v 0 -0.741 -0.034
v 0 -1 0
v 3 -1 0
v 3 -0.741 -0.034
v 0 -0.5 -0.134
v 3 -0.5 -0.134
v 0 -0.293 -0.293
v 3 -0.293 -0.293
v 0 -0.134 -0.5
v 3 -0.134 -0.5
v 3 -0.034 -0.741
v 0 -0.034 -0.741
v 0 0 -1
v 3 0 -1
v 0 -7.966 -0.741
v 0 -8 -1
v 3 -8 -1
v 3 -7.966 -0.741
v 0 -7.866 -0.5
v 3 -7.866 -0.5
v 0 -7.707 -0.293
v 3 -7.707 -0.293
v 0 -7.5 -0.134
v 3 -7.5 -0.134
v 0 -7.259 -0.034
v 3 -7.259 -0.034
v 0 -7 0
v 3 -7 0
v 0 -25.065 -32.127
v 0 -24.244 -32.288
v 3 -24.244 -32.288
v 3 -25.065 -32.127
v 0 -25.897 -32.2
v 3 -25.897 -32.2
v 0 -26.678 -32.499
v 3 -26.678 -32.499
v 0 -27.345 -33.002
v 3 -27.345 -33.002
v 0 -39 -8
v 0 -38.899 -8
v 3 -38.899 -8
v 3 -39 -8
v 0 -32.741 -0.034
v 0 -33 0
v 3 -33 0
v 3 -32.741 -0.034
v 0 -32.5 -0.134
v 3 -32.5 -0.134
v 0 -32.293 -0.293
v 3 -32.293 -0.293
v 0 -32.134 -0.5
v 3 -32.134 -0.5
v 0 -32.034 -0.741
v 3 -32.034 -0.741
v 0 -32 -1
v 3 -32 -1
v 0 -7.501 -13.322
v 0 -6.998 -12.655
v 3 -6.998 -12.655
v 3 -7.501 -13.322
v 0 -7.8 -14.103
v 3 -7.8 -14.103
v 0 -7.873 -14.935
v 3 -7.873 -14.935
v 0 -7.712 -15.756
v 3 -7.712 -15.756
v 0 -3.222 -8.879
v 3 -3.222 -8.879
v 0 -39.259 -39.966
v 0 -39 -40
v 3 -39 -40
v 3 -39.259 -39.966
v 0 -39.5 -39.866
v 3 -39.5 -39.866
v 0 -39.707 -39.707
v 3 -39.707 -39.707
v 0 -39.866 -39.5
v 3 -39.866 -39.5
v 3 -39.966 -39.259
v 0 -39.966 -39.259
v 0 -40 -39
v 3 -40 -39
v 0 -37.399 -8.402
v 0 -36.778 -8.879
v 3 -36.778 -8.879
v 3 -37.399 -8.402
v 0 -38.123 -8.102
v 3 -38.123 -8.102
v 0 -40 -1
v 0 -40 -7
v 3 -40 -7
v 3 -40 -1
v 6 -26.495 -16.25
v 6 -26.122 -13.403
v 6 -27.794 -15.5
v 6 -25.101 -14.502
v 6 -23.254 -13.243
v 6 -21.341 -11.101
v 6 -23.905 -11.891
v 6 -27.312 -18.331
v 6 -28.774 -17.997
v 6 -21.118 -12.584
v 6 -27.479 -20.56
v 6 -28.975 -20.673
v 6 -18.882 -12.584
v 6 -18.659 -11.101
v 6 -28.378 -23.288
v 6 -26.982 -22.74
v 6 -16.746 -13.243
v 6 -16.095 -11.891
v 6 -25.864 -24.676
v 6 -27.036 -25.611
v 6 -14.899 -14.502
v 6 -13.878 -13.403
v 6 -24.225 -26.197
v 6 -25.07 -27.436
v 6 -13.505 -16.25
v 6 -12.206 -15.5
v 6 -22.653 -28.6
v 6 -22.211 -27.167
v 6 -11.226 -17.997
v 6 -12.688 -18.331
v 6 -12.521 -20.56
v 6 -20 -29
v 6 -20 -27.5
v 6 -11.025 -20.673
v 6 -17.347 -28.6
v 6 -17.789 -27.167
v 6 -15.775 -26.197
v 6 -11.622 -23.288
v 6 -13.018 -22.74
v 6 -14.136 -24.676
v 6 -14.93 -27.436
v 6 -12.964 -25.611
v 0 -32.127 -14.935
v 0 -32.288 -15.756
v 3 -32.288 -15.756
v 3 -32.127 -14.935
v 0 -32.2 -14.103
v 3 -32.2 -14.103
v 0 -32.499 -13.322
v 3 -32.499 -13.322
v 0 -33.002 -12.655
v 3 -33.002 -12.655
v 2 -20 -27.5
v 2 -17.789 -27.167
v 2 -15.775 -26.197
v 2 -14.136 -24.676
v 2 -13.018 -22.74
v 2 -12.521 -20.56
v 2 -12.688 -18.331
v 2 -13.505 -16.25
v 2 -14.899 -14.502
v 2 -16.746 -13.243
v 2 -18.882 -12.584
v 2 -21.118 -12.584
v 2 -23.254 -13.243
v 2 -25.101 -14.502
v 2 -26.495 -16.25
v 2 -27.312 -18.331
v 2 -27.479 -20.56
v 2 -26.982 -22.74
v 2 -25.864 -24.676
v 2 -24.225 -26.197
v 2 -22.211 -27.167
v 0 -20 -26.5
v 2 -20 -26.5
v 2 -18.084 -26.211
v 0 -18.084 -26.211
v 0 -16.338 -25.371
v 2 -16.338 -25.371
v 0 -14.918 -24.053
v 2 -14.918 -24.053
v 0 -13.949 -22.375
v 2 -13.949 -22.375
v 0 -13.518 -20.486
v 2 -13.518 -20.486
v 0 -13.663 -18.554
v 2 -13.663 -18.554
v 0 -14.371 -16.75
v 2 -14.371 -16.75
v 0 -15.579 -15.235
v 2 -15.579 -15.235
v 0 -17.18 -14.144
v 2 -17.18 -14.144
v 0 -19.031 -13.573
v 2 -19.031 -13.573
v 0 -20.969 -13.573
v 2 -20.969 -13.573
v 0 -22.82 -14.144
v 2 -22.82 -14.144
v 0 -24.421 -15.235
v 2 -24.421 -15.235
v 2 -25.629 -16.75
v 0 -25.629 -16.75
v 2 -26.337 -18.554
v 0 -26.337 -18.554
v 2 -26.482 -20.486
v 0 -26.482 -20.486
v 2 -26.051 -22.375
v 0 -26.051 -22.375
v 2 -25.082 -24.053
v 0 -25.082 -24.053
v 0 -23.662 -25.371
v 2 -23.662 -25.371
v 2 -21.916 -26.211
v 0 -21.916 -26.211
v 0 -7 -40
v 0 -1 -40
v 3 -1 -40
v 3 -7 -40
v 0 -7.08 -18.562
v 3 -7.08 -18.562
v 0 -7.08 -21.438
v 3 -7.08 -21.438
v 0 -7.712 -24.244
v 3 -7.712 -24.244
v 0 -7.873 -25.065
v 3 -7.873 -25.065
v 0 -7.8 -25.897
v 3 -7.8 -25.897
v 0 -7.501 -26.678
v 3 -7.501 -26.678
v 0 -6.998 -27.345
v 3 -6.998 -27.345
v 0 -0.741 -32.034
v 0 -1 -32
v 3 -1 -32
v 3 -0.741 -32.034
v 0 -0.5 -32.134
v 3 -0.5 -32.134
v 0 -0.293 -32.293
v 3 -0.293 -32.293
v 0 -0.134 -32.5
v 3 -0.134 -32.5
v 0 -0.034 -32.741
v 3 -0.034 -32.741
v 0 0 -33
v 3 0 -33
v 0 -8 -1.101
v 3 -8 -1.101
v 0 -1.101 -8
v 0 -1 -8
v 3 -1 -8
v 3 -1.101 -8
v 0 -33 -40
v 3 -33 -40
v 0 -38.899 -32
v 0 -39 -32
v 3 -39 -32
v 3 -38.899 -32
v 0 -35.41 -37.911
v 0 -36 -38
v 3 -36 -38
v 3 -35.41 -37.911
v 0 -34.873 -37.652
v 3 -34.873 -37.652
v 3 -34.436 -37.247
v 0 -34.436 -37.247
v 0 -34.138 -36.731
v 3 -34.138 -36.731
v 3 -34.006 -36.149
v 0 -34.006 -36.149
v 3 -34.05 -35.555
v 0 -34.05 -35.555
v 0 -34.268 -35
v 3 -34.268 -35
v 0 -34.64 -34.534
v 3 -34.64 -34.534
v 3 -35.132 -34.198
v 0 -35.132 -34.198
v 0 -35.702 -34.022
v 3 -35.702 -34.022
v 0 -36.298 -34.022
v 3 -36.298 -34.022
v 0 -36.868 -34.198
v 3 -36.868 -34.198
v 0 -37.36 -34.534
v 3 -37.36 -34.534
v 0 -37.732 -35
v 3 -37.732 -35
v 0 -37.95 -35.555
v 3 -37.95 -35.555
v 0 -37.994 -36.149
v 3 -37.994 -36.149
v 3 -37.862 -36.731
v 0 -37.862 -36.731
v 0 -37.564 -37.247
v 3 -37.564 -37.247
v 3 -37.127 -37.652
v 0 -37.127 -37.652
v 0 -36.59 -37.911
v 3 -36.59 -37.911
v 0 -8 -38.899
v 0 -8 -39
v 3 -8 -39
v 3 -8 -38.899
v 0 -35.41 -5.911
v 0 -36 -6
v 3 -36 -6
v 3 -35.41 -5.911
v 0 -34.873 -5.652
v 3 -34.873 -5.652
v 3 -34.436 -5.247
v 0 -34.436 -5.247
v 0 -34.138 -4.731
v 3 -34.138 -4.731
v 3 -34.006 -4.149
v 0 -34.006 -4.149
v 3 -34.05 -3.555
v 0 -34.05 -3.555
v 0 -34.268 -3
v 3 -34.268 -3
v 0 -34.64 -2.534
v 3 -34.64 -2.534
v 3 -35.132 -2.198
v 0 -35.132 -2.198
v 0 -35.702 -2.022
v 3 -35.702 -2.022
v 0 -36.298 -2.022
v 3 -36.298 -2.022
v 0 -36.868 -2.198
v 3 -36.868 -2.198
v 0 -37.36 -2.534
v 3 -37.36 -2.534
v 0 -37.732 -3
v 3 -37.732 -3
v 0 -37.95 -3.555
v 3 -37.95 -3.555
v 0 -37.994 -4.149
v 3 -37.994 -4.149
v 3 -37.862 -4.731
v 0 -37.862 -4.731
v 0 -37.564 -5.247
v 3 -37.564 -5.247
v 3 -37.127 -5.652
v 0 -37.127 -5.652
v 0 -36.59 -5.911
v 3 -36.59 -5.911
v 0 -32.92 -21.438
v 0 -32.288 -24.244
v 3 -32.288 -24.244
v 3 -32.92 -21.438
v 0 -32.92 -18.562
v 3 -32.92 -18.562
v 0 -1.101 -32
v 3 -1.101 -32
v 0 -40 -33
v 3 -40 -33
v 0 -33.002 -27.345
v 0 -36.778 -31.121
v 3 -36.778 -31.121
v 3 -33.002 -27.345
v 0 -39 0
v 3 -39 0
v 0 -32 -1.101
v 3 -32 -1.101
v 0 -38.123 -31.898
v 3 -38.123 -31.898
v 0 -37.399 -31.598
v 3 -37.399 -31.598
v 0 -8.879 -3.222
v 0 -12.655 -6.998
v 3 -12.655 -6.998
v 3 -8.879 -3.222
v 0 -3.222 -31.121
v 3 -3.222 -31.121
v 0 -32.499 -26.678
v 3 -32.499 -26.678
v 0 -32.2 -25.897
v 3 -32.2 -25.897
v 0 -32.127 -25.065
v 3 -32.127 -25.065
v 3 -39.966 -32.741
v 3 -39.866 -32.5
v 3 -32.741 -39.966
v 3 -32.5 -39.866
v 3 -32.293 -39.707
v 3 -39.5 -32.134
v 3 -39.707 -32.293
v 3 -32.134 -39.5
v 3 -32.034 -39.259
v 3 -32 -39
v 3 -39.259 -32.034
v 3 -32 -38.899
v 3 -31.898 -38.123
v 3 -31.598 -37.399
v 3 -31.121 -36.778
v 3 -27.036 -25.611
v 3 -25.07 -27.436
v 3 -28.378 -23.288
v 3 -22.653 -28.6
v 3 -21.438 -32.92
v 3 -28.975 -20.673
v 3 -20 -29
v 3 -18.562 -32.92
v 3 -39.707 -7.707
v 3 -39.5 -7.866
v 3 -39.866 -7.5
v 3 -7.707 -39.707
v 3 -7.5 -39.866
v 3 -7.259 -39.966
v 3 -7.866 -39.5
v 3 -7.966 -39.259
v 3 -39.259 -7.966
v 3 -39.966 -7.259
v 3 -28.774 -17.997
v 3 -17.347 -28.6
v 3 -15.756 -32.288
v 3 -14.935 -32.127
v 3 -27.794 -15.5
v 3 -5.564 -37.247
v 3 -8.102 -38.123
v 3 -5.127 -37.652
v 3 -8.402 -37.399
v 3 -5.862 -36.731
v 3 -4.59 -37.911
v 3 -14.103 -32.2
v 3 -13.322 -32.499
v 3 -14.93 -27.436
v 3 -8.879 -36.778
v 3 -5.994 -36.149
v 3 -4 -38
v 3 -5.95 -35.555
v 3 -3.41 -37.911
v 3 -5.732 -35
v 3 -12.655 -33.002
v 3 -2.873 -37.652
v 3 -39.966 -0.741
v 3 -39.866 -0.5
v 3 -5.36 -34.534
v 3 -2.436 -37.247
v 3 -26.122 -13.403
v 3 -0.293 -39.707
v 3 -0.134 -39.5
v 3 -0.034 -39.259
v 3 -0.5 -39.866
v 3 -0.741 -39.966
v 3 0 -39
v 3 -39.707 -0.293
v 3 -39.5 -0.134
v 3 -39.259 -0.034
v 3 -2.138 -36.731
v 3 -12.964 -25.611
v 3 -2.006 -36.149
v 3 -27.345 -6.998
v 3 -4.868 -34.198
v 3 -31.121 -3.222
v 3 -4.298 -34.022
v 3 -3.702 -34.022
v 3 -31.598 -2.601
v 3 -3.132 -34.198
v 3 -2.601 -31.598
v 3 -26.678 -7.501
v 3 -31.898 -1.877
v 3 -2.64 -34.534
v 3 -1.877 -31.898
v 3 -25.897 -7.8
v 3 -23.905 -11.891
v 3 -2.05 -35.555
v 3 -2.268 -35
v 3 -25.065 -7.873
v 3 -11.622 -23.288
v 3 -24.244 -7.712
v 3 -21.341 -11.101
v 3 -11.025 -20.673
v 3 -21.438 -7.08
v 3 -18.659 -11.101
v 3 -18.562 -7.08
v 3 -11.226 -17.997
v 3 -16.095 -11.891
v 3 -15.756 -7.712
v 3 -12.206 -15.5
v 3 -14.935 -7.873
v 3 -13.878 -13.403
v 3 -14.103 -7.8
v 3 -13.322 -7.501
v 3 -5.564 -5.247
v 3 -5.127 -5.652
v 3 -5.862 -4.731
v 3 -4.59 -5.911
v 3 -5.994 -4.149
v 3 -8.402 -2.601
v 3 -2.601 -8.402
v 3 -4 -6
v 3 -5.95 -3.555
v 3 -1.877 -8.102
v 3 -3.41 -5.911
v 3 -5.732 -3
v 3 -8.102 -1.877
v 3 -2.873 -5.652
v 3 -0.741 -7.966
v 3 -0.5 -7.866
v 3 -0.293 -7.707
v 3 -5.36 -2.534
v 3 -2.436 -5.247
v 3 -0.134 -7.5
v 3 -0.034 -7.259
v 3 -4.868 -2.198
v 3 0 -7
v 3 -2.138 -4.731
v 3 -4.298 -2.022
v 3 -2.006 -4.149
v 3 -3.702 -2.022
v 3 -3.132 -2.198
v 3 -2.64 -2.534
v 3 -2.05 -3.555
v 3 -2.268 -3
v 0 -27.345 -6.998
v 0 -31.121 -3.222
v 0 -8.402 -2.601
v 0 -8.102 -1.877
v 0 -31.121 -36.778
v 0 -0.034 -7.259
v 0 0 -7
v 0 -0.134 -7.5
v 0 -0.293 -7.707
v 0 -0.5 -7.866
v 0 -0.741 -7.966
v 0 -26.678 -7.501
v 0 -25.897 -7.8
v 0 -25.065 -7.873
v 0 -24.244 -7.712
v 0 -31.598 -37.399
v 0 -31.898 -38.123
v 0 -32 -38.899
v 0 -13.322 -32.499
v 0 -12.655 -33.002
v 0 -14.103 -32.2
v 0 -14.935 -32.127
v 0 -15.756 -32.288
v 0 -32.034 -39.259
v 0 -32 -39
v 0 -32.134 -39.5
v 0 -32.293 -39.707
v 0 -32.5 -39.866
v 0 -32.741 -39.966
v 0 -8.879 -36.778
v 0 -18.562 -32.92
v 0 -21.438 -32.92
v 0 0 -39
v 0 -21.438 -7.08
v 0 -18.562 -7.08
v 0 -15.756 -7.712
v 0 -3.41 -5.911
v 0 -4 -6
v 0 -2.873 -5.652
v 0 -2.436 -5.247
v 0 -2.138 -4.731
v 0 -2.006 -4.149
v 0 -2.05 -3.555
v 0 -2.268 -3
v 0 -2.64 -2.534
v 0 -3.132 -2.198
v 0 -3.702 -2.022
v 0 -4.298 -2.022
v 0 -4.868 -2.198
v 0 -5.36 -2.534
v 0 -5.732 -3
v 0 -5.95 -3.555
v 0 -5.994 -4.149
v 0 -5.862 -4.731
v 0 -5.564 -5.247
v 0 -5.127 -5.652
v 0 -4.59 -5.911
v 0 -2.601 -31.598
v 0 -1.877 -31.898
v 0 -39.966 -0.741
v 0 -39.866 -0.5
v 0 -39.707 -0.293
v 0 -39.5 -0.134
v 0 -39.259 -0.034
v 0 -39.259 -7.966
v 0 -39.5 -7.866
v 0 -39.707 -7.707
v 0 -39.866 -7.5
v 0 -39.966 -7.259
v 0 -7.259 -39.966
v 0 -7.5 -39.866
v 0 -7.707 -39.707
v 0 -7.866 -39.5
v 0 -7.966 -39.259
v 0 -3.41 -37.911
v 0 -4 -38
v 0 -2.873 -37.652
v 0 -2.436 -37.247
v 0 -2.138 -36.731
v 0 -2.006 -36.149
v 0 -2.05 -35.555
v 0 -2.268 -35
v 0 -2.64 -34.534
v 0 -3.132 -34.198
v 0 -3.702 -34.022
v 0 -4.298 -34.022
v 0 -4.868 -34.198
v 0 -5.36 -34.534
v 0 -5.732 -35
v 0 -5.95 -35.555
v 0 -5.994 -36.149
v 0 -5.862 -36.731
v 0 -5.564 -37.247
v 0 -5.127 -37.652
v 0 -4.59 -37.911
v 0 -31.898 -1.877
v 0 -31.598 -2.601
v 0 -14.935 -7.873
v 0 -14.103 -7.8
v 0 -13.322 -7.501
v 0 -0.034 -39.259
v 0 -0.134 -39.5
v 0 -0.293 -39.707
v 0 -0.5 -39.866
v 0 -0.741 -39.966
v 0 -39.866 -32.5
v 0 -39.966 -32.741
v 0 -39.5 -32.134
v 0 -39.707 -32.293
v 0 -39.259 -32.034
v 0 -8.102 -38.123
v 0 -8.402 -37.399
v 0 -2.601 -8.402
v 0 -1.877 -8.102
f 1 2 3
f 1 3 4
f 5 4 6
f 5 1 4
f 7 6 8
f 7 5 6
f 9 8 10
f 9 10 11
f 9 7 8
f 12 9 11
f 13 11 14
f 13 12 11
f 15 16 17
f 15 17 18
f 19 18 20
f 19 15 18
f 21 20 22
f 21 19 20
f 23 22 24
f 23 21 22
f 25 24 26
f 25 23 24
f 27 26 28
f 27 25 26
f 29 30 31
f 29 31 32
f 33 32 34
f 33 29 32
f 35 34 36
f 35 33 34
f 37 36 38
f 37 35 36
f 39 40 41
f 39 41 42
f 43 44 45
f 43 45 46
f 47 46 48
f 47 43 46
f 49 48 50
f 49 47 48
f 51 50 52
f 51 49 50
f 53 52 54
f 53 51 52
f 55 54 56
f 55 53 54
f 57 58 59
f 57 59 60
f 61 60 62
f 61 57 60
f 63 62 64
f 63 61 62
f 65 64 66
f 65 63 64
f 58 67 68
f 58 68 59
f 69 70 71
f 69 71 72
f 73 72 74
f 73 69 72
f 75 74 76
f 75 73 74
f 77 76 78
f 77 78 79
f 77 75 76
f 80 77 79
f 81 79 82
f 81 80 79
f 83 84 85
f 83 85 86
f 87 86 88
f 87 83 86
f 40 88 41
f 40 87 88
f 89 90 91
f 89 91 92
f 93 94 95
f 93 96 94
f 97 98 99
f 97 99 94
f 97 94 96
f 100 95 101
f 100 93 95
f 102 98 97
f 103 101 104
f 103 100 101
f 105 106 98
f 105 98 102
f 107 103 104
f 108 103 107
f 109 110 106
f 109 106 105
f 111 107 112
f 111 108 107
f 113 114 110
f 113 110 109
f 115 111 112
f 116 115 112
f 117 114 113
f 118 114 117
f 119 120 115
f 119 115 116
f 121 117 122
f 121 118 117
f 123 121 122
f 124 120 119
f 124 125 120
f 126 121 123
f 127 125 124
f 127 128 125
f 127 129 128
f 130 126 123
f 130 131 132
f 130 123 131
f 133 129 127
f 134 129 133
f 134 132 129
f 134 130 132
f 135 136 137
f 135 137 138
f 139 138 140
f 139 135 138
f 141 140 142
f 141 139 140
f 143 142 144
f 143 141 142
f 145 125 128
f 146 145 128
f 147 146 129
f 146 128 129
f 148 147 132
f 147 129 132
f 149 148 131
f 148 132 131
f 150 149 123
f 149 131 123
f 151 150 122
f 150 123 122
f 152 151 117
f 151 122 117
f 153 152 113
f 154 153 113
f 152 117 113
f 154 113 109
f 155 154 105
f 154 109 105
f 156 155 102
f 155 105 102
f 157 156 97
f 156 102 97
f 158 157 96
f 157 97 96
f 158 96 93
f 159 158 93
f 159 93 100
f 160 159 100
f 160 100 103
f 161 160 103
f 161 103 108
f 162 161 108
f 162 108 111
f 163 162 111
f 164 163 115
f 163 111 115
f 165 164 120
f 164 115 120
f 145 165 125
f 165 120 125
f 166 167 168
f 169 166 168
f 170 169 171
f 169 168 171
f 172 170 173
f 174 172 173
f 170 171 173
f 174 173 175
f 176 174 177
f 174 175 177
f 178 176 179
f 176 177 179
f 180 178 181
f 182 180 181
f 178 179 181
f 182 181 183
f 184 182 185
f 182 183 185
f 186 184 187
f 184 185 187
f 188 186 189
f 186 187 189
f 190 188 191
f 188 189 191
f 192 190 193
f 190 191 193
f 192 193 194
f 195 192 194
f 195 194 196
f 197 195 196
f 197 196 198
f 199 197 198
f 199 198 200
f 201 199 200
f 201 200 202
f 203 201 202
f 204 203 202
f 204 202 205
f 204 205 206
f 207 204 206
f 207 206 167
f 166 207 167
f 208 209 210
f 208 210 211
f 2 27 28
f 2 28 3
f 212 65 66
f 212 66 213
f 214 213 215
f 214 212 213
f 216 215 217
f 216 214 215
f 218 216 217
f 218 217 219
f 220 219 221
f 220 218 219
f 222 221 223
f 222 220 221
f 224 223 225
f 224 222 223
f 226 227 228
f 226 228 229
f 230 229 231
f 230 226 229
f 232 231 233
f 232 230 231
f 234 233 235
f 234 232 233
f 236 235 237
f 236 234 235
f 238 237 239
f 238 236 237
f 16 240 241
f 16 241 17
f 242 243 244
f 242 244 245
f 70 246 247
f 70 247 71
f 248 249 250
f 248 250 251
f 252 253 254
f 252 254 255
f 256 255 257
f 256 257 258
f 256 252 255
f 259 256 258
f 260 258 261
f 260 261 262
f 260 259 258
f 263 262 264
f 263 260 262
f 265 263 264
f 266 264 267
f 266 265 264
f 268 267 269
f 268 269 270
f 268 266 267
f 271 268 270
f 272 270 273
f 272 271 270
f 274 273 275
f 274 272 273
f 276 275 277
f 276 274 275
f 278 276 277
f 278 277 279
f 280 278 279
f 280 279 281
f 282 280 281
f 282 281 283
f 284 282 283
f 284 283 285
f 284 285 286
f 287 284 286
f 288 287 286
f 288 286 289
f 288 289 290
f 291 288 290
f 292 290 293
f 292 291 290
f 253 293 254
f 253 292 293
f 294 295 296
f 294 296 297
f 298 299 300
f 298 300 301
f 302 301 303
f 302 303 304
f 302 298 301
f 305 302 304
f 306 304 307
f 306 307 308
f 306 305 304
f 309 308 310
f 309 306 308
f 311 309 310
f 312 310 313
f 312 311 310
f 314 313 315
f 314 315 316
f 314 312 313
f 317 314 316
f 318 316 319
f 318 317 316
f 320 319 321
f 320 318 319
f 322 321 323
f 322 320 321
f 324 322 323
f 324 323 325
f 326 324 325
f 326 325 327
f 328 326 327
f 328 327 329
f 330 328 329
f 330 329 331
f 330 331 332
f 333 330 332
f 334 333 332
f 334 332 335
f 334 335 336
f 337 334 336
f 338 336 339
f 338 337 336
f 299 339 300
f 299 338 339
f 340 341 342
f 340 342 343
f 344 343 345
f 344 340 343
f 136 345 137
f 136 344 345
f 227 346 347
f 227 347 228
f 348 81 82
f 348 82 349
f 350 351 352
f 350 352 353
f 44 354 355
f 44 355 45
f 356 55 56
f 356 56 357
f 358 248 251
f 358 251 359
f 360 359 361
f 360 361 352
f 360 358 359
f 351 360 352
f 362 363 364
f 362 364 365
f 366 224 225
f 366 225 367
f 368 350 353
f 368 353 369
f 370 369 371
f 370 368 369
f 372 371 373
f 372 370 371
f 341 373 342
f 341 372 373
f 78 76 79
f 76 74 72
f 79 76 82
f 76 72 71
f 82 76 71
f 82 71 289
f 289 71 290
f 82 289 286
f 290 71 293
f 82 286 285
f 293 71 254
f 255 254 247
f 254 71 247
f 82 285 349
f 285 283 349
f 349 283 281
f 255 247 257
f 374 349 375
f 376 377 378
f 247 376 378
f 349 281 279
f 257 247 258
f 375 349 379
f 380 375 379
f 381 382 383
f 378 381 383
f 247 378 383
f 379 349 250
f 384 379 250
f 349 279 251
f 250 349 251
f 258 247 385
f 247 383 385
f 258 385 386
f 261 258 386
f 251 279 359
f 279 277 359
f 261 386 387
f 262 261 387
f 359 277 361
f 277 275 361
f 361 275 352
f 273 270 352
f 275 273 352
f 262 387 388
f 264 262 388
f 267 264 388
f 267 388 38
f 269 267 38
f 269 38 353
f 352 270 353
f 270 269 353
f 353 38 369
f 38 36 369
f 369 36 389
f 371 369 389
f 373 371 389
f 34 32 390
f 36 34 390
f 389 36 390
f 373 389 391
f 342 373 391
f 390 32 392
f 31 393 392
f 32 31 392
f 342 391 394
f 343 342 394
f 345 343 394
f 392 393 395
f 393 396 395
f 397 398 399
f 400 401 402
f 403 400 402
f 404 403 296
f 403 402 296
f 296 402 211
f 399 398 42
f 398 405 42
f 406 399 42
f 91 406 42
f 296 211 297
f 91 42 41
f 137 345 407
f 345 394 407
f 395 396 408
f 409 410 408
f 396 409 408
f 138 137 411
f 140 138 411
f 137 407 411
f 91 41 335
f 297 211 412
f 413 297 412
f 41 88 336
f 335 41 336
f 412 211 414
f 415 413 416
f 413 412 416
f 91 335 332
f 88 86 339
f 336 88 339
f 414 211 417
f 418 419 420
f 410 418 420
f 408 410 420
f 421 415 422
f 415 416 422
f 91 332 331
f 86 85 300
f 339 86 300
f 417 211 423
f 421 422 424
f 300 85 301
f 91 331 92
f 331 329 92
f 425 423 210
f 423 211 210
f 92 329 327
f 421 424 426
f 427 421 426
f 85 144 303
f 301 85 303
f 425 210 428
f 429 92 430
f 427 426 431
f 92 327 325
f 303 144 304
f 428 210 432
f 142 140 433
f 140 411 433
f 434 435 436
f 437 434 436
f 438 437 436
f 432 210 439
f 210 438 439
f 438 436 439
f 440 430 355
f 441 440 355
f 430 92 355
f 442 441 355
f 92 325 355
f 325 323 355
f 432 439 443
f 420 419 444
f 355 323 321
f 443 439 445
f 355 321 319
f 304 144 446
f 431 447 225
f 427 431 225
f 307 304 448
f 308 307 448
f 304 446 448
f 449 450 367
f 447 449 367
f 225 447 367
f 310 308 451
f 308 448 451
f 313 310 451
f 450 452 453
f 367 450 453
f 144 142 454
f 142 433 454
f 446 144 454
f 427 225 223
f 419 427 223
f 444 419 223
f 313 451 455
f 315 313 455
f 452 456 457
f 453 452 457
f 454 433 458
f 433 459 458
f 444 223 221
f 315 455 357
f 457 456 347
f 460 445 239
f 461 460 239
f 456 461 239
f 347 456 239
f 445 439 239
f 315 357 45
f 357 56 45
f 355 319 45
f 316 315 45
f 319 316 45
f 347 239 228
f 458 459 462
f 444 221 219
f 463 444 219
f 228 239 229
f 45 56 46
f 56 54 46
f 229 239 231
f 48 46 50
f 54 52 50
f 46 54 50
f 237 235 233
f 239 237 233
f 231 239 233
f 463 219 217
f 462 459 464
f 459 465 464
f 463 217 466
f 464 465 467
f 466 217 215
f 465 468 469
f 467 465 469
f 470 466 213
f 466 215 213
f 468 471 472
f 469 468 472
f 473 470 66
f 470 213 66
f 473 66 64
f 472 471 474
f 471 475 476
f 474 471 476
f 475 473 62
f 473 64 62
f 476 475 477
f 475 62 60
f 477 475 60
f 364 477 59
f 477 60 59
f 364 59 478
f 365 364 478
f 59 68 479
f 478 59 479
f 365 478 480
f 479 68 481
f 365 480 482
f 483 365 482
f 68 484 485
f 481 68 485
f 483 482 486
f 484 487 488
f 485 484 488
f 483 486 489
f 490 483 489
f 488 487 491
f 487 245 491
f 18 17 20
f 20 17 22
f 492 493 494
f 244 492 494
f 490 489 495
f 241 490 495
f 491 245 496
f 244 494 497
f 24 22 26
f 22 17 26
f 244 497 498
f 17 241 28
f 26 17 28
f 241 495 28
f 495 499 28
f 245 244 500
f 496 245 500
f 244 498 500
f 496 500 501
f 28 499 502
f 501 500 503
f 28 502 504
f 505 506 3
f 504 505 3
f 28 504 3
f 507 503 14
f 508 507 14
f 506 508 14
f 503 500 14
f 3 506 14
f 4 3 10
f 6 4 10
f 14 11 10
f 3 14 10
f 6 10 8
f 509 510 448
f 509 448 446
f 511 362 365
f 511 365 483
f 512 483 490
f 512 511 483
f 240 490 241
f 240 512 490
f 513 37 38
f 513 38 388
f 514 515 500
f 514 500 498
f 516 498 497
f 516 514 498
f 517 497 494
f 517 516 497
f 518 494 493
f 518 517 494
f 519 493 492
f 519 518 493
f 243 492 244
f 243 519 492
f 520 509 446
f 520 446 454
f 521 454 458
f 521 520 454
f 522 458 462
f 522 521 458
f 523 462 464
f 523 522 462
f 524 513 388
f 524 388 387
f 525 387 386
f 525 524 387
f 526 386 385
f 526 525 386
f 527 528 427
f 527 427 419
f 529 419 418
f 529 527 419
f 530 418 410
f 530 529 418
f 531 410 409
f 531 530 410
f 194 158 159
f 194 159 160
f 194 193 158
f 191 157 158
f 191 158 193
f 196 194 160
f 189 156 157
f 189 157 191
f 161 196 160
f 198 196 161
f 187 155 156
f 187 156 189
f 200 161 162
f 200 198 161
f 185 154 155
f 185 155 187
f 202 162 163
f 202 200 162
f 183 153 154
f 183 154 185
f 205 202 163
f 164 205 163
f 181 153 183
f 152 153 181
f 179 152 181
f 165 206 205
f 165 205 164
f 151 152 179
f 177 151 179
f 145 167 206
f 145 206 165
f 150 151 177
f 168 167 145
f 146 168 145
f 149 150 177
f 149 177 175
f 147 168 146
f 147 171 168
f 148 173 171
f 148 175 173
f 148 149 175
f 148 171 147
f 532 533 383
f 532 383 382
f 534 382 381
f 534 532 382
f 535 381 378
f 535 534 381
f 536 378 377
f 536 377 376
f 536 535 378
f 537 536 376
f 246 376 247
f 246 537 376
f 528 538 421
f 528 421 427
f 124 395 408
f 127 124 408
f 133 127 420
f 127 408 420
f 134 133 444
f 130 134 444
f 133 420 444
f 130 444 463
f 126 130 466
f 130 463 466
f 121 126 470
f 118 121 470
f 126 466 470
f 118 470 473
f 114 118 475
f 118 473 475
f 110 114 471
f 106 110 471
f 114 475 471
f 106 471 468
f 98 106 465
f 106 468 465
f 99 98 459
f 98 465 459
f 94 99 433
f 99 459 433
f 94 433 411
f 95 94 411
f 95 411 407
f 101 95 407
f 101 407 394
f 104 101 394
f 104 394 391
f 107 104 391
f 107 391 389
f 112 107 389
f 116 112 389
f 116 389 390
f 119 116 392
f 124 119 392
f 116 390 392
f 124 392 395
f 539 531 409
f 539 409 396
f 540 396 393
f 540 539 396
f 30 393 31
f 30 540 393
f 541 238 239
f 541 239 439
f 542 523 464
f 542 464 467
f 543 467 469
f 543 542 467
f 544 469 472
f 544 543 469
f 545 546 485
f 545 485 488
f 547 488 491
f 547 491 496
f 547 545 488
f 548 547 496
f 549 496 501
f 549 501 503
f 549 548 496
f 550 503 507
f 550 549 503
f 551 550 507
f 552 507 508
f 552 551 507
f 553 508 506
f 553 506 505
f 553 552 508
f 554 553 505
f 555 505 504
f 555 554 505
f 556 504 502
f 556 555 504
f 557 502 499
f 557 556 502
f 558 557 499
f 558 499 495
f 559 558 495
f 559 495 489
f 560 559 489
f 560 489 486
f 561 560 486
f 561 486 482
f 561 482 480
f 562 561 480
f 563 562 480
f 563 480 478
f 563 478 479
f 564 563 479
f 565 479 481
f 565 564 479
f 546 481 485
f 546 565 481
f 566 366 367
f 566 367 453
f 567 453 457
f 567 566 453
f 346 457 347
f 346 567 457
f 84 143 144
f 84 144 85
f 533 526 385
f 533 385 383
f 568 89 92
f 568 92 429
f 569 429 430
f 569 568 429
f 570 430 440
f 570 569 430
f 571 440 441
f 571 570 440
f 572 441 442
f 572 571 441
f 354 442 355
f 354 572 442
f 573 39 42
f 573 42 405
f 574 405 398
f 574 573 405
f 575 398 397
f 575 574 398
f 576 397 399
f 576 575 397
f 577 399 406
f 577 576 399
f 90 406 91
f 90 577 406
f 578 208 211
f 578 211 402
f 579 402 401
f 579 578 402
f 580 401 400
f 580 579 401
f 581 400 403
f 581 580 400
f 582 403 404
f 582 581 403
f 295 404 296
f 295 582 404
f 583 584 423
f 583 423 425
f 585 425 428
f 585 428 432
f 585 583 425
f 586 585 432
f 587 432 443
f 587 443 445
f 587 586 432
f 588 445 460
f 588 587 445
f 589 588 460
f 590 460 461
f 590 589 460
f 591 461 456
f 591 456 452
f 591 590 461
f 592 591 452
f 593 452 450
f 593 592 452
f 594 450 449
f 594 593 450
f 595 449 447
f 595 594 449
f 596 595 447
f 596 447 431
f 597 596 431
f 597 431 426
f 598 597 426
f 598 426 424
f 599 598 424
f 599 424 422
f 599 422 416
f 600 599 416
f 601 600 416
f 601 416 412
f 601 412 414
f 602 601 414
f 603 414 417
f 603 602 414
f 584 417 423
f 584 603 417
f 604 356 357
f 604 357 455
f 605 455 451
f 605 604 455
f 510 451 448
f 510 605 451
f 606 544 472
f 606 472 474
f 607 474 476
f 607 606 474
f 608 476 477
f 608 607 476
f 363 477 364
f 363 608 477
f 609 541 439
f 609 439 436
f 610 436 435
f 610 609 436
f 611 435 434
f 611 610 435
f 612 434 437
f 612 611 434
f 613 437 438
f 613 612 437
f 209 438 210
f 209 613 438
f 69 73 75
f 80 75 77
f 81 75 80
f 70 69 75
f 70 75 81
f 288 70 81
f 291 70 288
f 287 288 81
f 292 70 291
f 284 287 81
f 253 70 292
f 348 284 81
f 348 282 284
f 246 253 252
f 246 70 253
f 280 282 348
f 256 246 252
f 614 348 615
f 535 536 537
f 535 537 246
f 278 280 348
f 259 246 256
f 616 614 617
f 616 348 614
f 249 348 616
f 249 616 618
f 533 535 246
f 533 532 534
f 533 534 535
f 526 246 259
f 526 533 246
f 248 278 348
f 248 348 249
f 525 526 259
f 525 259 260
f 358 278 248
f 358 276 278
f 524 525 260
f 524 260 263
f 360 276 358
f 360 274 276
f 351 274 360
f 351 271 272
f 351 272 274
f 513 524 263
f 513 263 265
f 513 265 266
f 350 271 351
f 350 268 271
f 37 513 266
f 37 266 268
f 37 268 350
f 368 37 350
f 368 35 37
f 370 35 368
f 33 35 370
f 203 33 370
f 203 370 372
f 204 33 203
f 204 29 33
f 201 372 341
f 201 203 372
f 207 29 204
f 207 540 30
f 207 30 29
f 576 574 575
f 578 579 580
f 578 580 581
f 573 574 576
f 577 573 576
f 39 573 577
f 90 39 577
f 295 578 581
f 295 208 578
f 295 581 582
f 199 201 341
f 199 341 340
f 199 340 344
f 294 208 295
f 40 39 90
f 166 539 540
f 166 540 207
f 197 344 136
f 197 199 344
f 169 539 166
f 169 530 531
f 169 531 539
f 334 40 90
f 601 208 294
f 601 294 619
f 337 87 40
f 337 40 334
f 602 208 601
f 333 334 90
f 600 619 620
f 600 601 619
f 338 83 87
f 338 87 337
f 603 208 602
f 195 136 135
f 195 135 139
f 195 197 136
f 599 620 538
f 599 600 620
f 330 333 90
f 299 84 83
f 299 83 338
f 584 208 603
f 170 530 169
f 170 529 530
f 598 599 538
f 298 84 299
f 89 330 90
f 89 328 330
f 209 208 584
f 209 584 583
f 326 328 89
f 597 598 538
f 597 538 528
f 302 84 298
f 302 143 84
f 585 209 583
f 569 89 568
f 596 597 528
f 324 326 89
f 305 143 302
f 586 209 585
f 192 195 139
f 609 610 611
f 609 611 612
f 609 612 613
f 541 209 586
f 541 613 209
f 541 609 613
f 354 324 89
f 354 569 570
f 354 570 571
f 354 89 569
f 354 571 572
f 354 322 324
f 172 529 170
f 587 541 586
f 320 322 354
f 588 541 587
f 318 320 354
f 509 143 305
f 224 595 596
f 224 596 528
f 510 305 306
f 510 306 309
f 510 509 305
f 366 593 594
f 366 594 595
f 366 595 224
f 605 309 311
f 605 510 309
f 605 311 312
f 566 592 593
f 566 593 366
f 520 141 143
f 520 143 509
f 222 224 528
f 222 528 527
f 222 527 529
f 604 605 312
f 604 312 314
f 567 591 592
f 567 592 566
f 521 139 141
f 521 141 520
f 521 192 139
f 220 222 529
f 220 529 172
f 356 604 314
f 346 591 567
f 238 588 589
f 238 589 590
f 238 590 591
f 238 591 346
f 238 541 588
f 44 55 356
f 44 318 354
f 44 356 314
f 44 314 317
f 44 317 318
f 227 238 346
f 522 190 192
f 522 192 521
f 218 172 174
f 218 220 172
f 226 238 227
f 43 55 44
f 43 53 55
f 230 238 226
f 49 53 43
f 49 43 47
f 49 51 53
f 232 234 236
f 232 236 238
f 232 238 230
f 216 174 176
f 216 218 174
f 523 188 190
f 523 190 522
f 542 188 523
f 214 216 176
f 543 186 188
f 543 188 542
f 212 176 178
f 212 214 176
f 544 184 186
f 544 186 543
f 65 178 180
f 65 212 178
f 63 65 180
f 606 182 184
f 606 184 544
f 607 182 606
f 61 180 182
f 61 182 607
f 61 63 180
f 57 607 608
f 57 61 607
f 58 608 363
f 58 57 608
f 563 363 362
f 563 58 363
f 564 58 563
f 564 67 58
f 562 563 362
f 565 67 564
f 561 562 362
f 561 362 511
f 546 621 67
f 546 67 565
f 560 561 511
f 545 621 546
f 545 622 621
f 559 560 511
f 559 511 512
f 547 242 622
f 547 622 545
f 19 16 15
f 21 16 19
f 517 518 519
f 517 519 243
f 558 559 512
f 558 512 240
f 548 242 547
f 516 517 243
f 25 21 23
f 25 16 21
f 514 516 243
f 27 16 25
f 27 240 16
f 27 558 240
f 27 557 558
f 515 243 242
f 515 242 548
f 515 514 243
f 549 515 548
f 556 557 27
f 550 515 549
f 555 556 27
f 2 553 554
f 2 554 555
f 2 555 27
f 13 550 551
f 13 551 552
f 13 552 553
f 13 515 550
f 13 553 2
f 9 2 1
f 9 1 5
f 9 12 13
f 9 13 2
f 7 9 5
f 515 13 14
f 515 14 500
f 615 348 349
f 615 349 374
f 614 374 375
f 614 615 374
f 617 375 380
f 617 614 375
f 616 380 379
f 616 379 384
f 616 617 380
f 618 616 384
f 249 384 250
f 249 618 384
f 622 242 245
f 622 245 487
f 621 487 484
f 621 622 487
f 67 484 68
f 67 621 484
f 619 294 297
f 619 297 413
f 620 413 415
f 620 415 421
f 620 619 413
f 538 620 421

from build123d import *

# Parameters (mm, degrees)
SKETCH_1_R          = 2
EXTRUDE_1_DEPTH     = 3
SKETCH_2_R          = 9
EXTRUDE_2_DEPTH     = 3
SKETCH_3_R          = 7.5
CUT_EXTRUDE_1_DEPTH = 4
SKETCH_4_R          = 6.5
CUT_EXTRUDE_2_DEPTH = 57.709787515


with BuildPart() as part:
    # 草图1 → 凸台-拉伸1 (new body)
    with BuildSketch(Plane(origin=(0, 0, 0), x_dir=(0, 0, -1), z_dir=(1, 0, 0))):
        with BuildLine():
            Line((1, 0), (7, 0))
            ThreePointArc((7, 0), (7.707106781, -0.292893219), (8, -1))
            Line((8, -1), (8, -1.100505063))
            ThreePointArc((8, -1.100505063), (8.228361402, -2.24855536), (8.878679656, -3.221825407))
            Line((8.878679656, -3.221825407), (12.65493215, -6.998077901))
            ThreePointArc((12.65493215, -6.998077901), (14.102815672, -7.800194378), (15.755705151, -7.712365515))
            ThreePointArc((15.755705151, -7.712365515), (20, -7), (24.244294849, -7.712365515))
            ThreePointArc((24.244294849, -7.712365515), (25.897184328, -7.800194378), (27.34506785, -6.998077901))
            Line((27.34506785, -6.998077901), (31.121320344, -3.221825407))
            ThreePointArc((31.121320344, -3.221825407), (31.771638598, -2.24855536), (32, -1.100505063))
            Line((32, -1.100505063), (32, -1))
            ThreePointArc((32, -1), (32.292893219, -0.292893219), (33, 0))
            Line((33, 0), (39, 0))
            ThreePointArc((39, 0), (39.707106781, -0.292893219), (40, -1))
            Line((40, -1), (40, -7))
            ThreePointArc((40, -7), (39.707106781, -7.707106781), (39, -8))
            Line((39, -8), (38.899494937, -8))
            ThreePointArc((38.899494937, -8), (37.75144464, -8.228361402), (36.778174593, -8.878679656))
            Line((36.778174593, -8.878679656), (33.001922099, -12.65493215))
            ThreePointArc((33.001922099, -12.65493215), (32.199805622, -14.102815672), (32.287634485, -15.755705151))
            ThreePointArc((32.287634485, -15.755705151), (33, -20), (32.287634485, -24.244294849))
            ThreePointArc((32.287634485, -24.244294849), (32.199805622, -25.897184328), (33.001922099, -27.34506785))
            Line((33.001922099, -27.34506785), (36.778174593, -31.121320344))
            ThreePointArc((36.778174593, -31.121320344), (37.75144464, -31.771638598), (38.899494937, -32))
            Line((38.899494937, -32), (39, -32))
            ThreePointArc((39, -32), (39.707106781, -32.292893219), (40, -33))
            Line((40, -33), (40, -39))
            ThreePointArc((40, -39), (39.707106781, -39.707106781), (39, -40))
            Line((39, -40), (33, -40))
            ThreePointArc((33, -40), (32.292893219, -39.707106781), (32, -39))
            Line((32, -39), (32, -38.899494937))
            ThreePointArc((32, -38.899494937), (31.771638598, -37.75144464), (31.121320344, -36.778174593))
            Line((31.121320344, -36.778174593), (27.34506785, -33.001922099))
            ThreePointArc((27.34506785, -33.001922099), (25.897184328, -32.199805622), (24.244294849, -32.287634485))
            ThreePointArc((24.244294849, -32.287634485), (20, -33), (15.755705151, -32.287634485))
            ThreePointArc((15.755705151, -32.287634485), (14.102815672, -32.199805622), (12.65493215, -33.001922099))
            Line((12.65493215, -33.001922099), (8.878679656, -36.778174593))
            ThreePointArc((8.878679656, -36.778174593), (8.228361402, -37.75144464), (8, -38.899494937))
            Line((8, -38.899494937), (8, -39))
            ThreePointArc((8, -39), (7.707106781, -39.707106781), (7, -40))
            Line((7, -40), (1, -40))
            ThreePointArc((1, -40), (0.292893219, -39.707106781), (0, -39))
            Line((0, -39), (0, -33))
            ThreePointArc((0, -33), (0.292893219, -32.292893219), (1, -32))
            Line((1, -32), (1.100505063, -32))
            ThreePointArc((1.100505063, -32), (2.24855536, -31.771638598), (3.221825407, -31.121320344))
            Line((3.221825407, -31.121320344), (6.998077901, -27.34506785))
            ThreePointArc((6.998077901, -27.34506785), (7.800194378, -25.897184328), (7.712365515, -24.244294849))
            ThreePointArc((7.712365515, -24.244294849), (7, -20), (7.712365515, -15.755705151))
            ThreePointArc((7.712365515, -15.755705151), (7.800194378, -14.102815672), (6.998077901, -12.65493215))
            Line((6.998077901, -12.65493215), (3.221825407, -8.878679656))
            ThreePointArc((3.221825407, -8.878679656), (2.24855536, -8.228361402), (1.100505063, -8))
            Line((1.100505063, -8), (1, -8))
            ThreePointArc((1, -8), (0.292893219, -7.707106781), (0, -7))
            Line((0, -7), (0, -1))
            ThreePointArc((0, -1), (0.292893219, -0.292893219), (1, 0))
        make_face()
        with Locations((4, -4)):
            Circle(SKETCH_1_R, mode=Mode.SUBTRACT)
        with Locations((36, -4)):
            Circle(SKETCH_1_R, mode=Mode.SUBTRACT)
        with Locations((4, -36)):
            Circle(SKETCH_1_R, mode=Mode.SUBTRACT)
        with Locations((36, -36)):
            Circle(SKETCH_1_R, mode=Mode.SUBTRACT)
    extrude(amount=EXTRUDE_1_DEPTH)

    # 草图2 → 凸台-拉伸2 (add)
    with BuildSketch(Plane(origin=(3, 0, 0), x_dir=(0, 0, -1), z_dir=(1, 0, 0))):
        with Locations((20, -20)):
            Circle(SKETCH_2_R)
    extrude(amount=EXTRUDE_2_DEPTH)

    # 草图3 → 切除-拉伸1 (cut)
    with BuildSketch(Plane(origin=(6, 0, 0), x_dir=(0, 0, -1), z_dir=(1, 0, 0))):
        with Locations((20, -20)):
            Circle(SKETCH_3_R)
    extrude(amount=-CUT_EXTRUDE_1_DEPTH, mode=Mode.SUBTRACT)

    # 草图4 → 切除-拉伸2 (cut, through all)
    with BuildSketch(Plane(origin=(2, 0, 0), x_dir=(0, 0, -1), z_dir=(1, 0, 0))):
        with Locations((20, -20)):
            Circle(SKETCH_4_R)
    extrude(amount=-CUT_EXTRUDE_2_DEPTH, mode=Mode.SUBTRACT)


solid = part.part
